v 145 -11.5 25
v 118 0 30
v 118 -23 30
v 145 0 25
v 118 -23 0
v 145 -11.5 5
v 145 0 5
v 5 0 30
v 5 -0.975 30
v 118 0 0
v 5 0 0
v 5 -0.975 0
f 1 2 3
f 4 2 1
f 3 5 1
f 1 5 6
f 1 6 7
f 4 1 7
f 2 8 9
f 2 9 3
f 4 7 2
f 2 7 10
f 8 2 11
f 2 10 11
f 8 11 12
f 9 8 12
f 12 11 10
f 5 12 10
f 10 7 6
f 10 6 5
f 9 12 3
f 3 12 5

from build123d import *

# Parameters (mm, degrees)
F1_DEPTH = 30
F3_DEPTH = 25


with BuildPart() as f1:
    # F0 (on Top) → F1 (new body)
    with BuildSketch(Plane.XY):
        Polygon((145, 0), (5, 0), (5, -0.974576), (118, -23), (145, -11.5), align=None)
    extrude(amount=F1_DEPTH)

    # F2 (on Front) → F3 (cut)
    with BuildSketch(Plane.XZ):
        Polygon((118, 0), (145, 0), (145, 5), align=None)
        Polygon((145, 30), (118, 30), (145, 25), align=None)
    extrude(amount=F3_DEPTH, mode=Mode.SUBTRACT)


solid = f1.part
